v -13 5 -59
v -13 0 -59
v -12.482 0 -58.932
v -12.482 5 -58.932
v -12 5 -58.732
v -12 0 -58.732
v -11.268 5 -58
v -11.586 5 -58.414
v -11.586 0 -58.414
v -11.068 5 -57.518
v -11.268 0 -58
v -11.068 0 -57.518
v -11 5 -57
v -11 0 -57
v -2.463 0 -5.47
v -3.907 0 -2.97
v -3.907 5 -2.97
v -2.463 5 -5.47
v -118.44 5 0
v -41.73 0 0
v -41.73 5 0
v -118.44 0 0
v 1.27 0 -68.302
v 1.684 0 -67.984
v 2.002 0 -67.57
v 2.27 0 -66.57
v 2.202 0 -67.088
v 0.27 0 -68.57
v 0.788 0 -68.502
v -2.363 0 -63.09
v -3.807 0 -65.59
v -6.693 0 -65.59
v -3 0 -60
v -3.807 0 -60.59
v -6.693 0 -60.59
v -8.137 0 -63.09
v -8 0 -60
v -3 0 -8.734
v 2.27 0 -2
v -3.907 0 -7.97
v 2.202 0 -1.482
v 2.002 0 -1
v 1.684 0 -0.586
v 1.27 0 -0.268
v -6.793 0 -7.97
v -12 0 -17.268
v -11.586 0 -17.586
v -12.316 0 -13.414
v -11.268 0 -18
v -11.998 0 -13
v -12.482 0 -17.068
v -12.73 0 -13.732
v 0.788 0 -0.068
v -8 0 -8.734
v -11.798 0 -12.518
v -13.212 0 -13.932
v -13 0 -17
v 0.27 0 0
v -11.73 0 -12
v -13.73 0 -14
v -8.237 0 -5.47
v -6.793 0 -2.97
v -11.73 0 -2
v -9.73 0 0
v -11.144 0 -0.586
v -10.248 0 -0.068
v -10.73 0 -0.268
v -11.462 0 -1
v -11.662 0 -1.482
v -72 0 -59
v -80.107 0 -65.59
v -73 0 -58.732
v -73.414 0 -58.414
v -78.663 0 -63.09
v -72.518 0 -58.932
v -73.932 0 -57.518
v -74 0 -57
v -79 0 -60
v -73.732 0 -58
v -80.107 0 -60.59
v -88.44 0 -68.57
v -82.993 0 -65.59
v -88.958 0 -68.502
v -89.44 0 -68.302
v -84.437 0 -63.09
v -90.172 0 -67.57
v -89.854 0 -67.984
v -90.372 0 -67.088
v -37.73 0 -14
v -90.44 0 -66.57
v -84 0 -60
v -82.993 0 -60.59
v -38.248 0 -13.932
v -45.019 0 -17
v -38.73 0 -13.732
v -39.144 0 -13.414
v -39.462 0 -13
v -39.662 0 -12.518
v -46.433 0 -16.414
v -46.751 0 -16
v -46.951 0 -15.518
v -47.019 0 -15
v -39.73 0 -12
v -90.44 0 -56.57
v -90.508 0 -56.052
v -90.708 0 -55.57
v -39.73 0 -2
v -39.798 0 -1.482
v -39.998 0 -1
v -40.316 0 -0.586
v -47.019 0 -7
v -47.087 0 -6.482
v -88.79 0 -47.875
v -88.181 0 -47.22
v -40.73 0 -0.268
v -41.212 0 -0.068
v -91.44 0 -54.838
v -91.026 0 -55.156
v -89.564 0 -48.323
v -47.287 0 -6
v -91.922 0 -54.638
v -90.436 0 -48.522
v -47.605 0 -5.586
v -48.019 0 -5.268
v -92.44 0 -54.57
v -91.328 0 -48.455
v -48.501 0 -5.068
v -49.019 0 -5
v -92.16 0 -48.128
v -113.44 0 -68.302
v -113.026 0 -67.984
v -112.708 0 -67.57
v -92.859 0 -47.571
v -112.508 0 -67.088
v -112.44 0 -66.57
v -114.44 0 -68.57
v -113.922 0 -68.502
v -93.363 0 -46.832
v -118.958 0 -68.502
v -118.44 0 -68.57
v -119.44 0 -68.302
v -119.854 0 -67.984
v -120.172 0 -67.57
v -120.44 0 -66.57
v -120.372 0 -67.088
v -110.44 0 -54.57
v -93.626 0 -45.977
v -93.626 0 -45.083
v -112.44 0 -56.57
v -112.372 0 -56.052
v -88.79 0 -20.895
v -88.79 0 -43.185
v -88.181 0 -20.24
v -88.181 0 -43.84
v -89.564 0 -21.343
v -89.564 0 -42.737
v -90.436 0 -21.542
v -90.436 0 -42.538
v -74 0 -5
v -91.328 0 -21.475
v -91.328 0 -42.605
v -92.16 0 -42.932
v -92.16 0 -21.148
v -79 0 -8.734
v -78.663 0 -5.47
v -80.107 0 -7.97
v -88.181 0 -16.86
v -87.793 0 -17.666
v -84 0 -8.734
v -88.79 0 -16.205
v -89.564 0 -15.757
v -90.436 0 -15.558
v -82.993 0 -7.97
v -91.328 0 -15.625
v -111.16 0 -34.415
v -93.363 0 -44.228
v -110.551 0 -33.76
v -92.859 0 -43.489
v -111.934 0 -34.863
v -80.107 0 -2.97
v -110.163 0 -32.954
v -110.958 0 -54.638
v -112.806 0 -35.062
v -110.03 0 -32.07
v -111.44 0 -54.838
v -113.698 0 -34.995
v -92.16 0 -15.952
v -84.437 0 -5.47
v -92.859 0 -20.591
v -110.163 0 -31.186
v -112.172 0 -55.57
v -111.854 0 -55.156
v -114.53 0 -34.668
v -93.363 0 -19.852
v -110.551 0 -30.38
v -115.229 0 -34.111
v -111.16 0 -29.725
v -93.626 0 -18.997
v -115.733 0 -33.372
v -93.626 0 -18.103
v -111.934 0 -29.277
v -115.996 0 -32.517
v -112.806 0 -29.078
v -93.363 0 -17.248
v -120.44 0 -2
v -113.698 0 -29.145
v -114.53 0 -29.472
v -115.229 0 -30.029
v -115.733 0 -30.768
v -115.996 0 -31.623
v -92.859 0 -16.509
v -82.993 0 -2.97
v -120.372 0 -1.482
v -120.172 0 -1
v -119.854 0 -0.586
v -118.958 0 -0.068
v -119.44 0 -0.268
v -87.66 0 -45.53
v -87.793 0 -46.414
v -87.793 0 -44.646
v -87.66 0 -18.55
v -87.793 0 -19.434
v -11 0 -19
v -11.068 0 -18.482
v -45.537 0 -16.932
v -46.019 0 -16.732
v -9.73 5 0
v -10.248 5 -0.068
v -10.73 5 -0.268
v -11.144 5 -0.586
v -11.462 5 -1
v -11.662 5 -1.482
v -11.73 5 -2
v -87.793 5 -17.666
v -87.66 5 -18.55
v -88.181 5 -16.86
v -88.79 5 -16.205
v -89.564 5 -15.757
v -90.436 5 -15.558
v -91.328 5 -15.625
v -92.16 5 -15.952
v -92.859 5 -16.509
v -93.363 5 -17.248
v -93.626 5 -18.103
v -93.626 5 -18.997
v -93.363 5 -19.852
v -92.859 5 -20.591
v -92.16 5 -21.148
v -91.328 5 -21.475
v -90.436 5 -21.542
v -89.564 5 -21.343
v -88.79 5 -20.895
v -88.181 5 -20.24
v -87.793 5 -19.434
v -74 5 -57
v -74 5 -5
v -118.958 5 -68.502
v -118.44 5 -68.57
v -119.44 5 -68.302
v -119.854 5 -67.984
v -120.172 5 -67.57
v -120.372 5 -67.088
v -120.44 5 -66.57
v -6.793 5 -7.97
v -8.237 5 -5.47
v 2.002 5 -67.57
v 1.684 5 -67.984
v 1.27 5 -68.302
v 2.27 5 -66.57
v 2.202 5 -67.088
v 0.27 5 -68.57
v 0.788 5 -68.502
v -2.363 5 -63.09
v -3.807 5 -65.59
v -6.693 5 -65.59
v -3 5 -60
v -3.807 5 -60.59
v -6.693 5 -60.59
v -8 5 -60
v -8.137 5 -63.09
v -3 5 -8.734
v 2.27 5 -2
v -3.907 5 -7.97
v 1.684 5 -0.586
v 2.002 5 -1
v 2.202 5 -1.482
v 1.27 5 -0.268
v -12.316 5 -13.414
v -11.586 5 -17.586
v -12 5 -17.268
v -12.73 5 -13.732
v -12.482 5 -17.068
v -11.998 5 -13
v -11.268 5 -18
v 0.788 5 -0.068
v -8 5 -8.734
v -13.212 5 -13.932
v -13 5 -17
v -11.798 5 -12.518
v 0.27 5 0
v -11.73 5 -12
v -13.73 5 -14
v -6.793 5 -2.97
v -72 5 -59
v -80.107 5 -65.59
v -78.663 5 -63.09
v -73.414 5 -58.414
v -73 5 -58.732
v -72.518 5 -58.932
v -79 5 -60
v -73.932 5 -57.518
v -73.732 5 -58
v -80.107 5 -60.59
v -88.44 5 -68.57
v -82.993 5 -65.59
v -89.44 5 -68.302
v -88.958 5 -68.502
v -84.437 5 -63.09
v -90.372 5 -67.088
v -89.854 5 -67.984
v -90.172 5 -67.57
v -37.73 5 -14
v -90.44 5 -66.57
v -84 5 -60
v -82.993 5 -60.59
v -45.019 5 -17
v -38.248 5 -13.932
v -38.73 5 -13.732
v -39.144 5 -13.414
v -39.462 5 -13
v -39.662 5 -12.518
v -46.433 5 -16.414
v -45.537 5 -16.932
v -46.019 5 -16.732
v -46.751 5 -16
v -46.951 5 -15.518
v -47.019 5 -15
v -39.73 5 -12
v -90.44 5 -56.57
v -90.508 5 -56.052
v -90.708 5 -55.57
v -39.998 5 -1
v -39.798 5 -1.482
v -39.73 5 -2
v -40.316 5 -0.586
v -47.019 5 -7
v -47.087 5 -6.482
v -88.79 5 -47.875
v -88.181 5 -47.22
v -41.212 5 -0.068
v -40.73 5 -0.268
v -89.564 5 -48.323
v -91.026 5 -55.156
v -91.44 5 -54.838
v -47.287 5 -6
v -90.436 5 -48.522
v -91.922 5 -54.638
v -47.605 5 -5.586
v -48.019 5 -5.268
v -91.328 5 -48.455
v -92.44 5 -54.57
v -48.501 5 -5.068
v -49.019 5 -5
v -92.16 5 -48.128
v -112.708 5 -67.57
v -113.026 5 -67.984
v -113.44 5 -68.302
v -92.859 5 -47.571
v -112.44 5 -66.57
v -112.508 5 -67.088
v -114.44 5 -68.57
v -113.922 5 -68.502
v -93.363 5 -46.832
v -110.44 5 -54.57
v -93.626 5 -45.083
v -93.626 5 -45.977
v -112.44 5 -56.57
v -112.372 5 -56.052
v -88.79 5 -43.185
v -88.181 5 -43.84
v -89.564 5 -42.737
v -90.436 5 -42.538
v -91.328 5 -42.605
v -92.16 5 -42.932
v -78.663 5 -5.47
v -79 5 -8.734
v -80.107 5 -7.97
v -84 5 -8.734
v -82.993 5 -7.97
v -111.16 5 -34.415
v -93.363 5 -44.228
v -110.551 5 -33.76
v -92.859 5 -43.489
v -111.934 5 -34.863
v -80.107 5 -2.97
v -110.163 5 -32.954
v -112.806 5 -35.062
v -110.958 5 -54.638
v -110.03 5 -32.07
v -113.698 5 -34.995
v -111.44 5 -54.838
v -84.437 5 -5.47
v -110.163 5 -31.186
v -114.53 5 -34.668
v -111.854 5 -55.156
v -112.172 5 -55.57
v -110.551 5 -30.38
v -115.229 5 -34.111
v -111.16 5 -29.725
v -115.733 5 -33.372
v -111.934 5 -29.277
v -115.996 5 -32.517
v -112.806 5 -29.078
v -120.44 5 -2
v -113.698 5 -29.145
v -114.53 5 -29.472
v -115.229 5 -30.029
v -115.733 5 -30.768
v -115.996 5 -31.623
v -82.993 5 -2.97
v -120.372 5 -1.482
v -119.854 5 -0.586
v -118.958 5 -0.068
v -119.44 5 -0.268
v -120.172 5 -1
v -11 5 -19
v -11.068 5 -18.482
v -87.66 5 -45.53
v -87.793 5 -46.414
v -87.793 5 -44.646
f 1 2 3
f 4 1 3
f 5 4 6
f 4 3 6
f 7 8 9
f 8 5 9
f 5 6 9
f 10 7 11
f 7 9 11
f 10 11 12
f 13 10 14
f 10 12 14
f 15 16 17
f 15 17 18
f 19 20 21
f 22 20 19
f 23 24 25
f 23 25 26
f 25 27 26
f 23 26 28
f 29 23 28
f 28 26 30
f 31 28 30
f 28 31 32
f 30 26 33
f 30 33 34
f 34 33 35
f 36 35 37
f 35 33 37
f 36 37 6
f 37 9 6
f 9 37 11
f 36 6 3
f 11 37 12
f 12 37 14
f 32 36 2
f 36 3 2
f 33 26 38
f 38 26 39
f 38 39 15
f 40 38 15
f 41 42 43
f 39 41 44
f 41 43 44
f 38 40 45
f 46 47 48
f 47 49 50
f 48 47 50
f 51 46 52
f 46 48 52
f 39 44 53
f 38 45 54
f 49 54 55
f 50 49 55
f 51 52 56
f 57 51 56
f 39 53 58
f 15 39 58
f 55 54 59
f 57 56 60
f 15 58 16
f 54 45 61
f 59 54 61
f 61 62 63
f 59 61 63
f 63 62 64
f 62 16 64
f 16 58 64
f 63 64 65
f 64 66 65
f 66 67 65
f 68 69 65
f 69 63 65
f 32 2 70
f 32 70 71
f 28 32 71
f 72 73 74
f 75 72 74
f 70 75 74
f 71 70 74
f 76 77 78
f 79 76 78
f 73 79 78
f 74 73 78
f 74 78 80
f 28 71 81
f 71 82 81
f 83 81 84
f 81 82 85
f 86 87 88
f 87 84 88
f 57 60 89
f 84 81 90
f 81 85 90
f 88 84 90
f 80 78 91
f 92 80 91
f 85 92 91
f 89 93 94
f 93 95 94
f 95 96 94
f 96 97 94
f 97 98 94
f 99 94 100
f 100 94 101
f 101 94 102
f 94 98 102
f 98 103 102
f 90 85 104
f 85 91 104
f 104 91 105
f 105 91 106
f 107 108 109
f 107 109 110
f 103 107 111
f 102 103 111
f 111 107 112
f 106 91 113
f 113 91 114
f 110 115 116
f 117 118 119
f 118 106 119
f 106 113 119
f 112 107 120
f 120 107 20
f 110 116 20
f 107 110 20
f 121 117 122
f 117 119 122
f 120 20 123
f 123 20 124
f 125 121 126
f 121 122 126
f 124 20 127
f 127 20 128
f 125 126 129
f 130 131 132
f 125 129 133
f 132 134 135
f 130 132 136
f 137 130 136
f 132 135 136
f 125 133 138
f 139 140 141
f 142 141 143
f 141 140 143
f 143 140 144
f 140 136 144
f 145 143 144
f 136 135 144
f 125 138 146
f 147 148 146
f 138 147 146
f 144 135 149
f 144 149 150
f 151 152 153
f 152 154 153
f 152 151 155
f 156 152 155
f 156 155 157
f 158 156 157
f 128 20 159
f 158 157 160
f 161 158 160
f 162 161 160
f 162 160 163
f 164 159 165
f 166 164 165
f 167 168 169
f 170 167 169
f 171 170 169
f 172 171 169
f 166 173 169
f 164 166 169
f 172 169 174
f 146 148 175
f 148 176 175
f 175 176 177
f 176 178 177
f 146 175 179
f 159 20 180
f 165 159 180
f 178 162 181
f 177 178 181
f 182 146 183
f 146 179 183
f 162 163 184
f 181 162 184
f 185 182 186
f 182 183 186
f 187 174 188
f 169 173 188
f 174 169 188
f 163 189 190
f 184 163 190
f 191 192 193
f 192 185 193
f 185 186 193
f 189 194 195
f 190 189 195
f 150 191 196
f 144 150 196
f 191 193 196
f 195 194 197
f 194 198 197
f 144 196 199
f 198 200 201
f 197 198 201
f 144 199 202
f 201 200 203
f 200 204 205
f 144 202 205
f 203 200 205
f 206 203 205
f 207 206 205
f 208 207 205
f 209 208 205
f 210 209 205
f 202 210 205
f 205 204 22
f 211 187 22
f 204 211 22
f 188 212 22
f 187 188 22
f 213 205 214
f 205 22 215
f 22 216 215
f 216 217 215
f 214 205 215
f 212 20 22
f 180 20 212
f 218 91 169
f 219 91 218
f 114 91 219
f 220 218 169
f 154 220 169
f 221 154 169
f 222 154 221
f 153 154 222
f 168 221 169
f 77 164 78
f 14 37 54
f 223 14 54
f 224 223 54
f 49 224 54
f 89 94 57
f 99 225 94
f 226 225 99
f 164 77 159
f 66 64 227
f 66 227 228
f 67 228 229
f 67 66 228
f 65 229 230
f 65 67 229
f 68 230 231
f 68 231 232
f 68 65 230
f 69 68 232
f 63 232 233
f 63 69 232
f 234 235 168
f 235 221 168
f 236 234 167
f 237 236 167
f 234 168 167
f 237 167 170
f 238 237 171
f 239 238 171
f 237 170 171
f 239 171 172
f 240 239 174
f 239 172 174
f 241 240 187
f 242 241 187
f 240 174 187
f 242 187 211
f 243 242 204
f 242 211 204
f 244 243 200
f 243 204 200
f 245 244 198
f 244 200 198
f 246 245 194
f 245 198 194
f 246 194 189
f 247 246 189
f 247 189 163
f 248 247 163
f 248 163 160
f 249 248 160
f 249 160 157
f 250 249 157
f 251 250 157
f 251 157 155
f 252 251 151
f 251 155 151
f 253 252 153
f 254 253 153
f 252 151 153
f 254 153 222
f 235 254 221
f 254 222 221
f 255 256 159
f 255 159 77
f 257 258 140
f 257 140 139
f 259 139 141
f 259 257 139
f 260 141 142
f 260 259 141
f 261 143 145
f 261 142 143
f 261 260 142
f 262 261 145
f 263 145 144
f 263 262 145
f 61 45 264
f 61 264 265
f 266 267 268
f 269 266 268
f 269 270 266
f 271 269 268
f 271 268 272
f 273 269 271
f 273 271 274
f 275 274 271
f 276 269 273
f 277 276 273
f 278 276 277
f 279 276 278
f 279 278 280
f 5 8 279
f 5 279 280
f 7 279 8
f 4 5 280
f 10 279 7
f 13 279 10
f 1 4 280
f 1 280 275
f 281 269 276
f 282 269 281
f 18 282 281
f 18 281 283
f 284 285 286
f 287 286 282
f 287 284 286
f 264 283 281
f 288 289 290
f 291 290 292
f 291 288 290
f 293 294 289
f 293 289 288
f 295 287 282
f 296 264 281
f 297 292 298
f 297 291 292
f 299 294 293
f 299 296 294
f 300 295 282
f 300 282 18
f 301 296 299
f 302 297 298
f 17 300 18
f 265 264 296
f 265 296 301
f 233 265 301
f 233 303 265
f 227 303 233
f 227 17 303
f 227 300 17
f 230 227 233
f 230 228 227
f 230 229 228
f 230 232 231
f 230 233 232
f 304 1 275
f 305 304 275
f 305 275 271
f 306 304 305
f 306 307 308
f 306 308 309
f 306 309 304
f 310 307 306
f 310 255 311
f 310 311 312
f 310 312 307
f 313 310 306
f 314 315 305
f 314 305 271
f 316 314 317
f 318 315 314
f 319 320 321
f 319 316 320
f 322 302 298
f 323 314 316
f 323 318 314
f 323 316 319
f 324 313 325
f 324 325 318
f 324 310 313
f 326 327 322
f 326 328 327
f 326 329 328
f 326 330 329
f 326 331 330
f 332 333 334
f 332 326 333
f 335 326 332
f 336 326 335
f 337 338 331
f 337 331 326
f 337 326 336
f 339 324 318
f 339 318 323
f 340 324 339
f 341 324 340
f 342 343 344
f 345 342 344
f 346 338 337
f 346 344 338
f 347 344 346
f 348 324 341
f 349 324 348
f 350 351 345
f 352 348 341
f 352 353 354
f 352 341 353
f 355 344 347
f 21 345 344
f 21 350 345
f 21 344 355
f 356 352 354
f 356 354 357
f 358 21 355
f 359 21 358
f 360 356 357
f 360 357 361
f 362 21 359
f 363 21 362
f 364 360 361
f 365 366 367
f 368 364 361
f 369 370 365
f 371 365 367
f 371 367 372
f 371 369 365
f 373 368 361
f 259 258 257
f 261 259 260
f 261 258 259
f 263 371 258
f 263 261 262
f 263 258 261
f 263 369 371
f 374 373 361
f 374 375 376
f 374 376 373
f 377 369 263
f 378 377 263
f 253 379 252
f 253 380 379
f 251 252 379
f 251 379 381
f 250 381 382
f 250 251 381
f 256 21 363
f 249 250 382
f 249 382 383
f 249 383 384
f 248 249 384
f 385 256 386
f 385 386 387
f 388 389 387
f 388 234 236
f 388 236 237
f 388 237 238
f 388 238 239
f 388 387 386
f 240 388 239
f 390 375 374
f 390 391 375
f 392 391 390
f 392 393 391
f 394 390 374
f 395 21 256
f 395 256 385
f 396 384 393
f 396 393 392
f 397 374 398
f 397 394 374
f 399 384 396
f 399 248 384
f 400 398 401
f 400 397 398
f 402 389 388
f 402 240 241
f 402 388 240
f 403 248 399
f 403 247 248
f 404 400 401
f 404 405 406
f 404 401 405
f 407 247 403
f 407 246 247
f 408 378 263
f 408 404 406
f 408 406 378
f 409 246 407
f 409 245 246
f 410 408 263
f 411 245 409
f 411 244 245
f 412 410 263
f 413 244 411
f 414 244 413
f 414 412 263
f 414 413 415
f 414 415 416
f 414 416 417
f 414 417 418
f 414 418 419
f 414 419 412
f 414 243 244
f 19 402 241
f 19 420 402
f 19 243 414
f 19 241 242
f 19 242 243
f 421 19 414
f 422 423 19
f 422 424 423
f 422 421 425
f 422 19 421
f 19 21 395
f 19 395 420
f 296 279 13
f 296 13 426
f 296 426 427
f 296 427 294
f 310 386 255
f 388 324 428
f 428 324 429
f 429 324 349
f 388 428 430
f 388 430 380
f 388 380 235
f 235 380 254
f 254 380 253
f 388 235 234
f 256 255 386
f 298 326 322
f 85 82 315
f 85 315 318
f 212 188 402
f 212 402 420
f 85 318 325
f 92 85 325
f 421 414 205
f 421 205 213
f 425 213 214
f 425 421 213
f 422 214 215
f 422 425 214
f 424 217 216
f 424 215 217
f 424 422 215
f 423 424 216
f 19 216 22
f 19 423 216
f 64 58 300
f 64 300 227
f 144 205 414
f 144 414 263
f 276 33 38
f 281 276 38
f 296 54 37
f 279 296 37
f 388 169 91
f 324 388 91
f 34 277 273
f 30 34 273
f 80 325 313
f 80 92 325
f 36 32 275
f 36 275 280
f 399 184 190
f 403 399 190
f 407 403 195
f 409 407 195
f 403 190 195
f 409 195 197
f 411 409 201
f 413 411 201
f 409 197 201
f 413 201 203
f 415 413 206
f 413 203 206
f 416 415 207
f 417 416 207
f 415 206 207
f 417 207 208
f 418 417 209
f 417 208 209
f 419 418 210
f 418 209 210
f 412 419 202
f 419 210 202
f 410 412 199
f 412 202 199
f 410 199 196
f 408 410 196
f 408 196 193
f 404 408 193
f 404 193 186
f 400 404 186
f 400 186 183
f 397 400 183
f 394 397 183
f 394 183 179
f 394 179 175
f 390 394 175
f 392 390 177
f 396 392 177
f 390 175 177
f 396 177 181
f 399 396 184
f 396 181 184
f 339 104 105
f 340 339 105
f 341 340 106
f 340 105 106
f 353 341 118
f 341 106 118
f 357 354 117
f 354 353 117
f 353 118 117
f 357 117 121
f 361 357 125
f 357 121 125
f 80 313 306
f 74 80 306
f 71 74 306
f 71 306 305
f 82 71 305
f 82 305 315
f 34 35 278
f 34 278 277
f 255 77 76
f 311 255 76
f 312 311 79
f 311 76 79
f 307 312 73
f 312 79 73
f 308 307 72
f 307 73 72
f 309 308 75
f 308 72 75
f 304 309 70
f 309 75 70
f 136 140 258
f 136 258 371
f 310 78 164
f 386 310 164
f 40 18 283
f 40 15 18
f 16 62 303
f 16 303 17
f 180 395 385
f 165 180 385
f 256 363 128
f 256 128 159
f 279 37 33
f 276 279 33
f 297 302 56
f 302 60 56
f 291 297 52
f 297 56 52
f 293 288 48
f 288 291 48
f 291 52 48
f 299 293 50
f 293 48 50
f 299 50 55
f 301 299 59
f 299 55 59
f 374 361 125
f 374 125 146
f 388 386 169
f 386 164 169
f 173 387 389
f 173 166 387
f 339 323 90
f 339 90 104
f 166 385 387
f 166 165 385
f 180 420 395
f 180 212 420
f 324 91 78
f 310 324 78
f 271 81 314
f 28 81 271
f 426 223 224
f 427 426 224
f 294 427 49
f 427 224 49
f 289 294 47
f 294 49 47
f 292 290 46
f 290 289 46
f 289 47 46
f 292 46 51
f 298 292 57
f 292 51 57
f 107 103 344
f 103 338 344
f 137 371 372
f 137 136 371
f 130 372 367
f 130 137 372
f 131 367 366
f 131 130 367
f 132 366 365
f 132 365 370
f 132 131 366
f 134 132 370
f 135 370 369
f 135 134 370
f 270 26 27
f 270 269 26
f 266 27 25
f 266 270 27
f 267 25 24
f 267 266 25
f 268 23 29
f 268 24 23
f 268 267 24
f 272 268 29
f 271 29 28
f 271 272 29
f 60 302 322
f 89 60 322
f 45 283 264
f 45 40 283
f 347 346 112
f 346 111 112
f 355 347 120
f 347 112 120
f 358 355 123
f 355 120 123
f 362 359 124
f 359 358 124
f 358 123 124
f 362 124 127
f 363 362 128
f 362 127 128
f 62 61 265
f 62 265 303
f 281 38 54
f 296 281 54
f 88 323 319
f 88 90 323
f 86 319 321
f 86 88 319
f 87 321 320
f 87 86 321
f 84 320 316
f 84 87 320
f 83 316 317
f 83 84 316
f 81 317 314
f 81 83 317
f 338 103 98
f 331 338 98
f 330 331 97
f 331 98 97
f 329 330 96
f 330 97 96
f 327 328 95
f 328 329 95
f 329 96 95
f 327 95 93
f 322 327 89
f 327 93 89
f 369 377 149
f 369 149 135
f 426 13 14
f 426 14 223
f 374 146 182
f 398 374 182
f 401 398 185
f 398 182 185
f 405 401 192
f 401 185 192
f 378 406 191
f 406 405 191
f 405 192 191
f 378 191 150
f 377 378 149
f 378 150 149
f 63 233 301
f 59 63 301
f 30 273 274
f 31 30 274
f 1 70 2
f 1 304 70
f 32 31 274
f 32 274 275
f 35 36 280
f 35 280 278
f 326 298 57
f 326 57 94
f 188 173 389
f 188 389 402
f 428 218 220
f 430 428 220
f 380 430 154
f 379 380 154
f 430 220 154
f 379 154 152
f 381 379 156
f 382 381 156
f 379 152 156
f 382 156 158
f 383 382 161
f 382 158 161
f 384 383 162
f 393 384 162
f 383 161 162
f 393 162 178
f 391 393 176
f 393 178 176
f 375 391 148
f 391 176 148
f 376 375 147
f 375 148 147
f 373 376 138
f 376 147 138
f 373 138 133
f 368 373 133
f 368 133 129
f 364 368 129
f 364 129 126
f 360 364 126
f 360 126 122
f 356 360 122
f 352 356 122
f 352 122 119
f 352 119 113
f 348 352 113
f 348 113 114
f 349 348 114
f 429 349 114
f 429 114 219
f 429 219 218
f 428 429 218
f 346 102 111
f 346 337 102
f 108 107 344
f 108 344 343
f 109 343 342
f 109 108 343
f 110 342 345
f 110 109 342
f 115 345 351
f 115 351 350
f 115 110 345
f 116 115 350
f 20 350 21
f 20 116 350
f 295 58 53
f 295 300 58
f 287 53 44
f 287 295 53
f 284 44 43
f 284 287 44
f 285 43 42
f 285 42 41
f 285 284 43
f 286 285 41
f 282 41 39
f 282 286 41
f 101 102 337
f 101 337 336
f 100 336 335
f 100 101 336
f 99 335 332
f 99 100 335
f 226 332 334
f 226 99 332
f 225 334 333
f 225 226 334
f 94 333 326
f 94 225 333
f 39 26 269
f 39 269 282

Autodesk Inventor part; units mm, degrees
ref_plane "YZ Plane" through (0, 0, 0) normal (1, 0, 0) x (0, 1, 0)
ref_plane "XZ Plane" through (0, 0, 0) normal (0, 1, 0) x (-1, 0, 0)
ref_plane "XY Plane" through (0, 0, 0) normal (0, 0, 1) x (1, 0, 0)
sketch "Sketch1" plane through (0, 0, 0) normal (0, 1, 0) x (-1, 0, 0)
  line L0 (-2.27, 0) -> (120.44, 0)
  line L1 (120.44, 0) -> (120.44, -68.57)
  line L2 (120.44, -68.57) -> (-2.27, -68.57)
  line L3 (-2.27, -68.57) -> (-2.27, 0)
  line L4 (120.44, -66.57) -> (120.44, -2)
  line L5 (0, -68.57) -> (118.44, -68.57)
  line L6 (-2.27, -2.27) -> (-2.27, -66.3)
  circle A0 centre (81.55, -63.09) radius 1.5
  circle A1 centre (81.55, -63.09) radius 1.5
  line L7 (70.44, -68.57) -> (15.73, -68.57)
  line L8 (51, 0) -> (75, 0)
  line L9 (26, 0) -> (51, 0)
  line L10 (84, -60) -> (79, -60)
  line L11 (79, -60) -> (79, -8.7337)
  line L12 (79, -8.7337) -> (84, -8.7337)
  line L13 (84, -8.7337) -> (84, -60)
  line L14 (8, -60) -> (3, -60)
  line L15 (3, -60) -> (3, -8.7337)
  line L16 (3, -8.7337) -> (8, -8.7337)
  line L17 (8, -8.7337) -> (8, -60)
  circle A2 centre (5.25, -63.09) radius 1.5
  circle A3 centre (5.35, -5.47) radius 1.5
  circle A4 centre (81.55, -5.47) radius 1.5
  circle A5 centre (81.55, -5.47) radius 1.5
  circle A6 centre (5.35, -5.47) radius 1.5
  circle A7 centre (5.25, -63.09) radius 1.5
  dimension "d20" = 3
  dimension "d27" = 3
  dimension "d28" = 3
  dimension "d29" = 3
  dimension "d30" = 68.57
extrude "Extrusion1" add sketch "Sketch1" along normal blind 5
fillet "Fillet4" radius 2 4 edges at (-120.44, 2.5, -68.57) (-120.44, 2.5, 0) (2.27, 2.5, -68.57) (2.27, 2.5, 0)
sketch "Sketch7" plane through (0, 5, 0) normal (0, 1, 0) x (1, 0, 0)
  line L0 (-117.44, 63.57) -> (-87.44, 63.57)
  line L1 (-87.44, 63.57) -> (-87.44, 5)
  line L2 (-87.44, 5) -> (-117.44, 5)
  line L3 (-117.44, 5) -> (-117.44, 63.57)
  line L4 (-120.44, 66.57) -> (-120.44, 2) projected
  line L5 (0.27, 68.57) -> (-118.44, 68.57) projected
  line L6 (-118.44, 0) -> (0.27, 0) projected
  point P0 (0, 0)
  dimension "d67" = 30
  dimension "d68" = 3
  dimension "d69" = 5
  dimension "d70" = 5
extrude "Extrusion6" [suppressed]
fillet "Fillet8" [suppressed]
sketch "Sketch8" plane through (0, 5, 0) normal (0, 1, 0) x (1, 0, 0)
  line L0 (-118.44, 0) -> (0.27, 0) projected
  line L1 (-39.73, 0) -> (-11.73, 0)
  line L2 (-11.73, 0) -> (-11.73, 14)
  line L3 (-11.73, 14) -> (-39.73, 14)
  line L4 (-39.73, 14) -> (-39.73, 0)
  line L5 (2.27, 2) -> (2.27, 66.57) projected
  point P0 (0, 0)
  point P1 (-11.73, 0)
  dimension "d74" = 28
  dimension "d75" = 14
  dimension "d82" = 14
extrude "Extrusion7" cut sketch "Sketch8" against normal blind 10
sketch "Sketch9" plane through (0, 5, 0) normal (0, 1, 0) x (1, 0, 0)
  line L0 (-74, 59) -> (-11, 59)
  line L1 (-11, 59) -> (-11, 17)
  line L2 (-11, 17) -> (-74, 17)
  line L3 (-74, 17) -> (-74, 59)
  line L4 (-74, 17) -> (-47.019, 17)
  line L5 (-47.019, 17) -> (-47.019, 5)
  line L6 (-47.019, 5) -> (-74, 5)
  line L7 (-74, 5) -> (-74, 17)
  point P0 (0, 0)
extrude "Extrusion8" cut sketch "Sketch9" against normal blind 5
fillet "Fillet9" radius 2 5 edges at (-74, 2.5, -59) (-11, 2.5, -59) (-11, 2.5, -17) (-47.019, 2.5, -5) (-47.019, 2.5, -17)
fillet "Fillet10" radius 2 4 edges at (-39.73, 2.5, -14) (-11.73, 2.5, -14) (-11.73, 2.5, 0) (-39.73, 2.5, 0)
sketch "Sketch10" plane through (0, 0, 0) normal (0, -1, 0) x (1, 0, 0)
  circle A0 centre (-90.66, -18.55) radius 3
  circle A1 centre (-113.03, -32.07) radius 3
  circle A2 centre (-90.66, -45.53) radius 3
  line L0 (-120.44, -66.57) -> (-120.44, -2) projected
  line L1 (-118.44, 0) -> (-41.73, 0) projected
  line L2 (-90.66, -45.53) -> (-90.66, -18.55) construction
  point P0 (0, 0)
  dimension "d83" = 29.78
  dimension "d84" = 18.55
  dimension "d85" = 6
  dimension "d86" = 13.52
  dimension "d87" = 6
  dimension "d88" = 22.37
  dimension "d89" = 13.46
  dimension "d90" = 6
extrude "Extrusion9" cut sketch "Sketch10" against normal blind 10
sketch "Sketch11" plane through (0, 0, 0) normal (0, -1, 0) x (1, 0, 0)
  circle A0 centre (-90.66, -18.55) radius 3 projected
  line L0 (-92.9694, -18.55) -> (-91.8147, -16.55)
  line L1 (-91.8147, -16.55) -> (-89.5053, -16.55)
  line L2 (-89.5053, -16.55) -> (-88.3506, -18.55)
  line L3 (-88.3506, -18.55) -> (-89.5053, -20.55)
  line L4 (-89.5053, -20.55) -> (-91.8147, -20.55)
  line L5 (-91.8147, -20.55) -> (-92.9694, -18.55)
  circle A1 centre (-113.03, -32.07) radius 3 projected
  line L6 (-115.3394, -32.07) -> (-114.1847, -30.07)
  line L7 (-114.1847, -30.07) -> (-111.8753, -30.07)
  line L8 (-111.8753, -30.07) -> (-110.7206, -32.07)
  line L9 (-110.7206, -32.07) -> (-111.8753, -34.07)
  line L10 (-111.8753, -34.07) -> (-114.1847, -34.07)
  line L11 (-114.1847, -34.07) -> (-115.3394, -32.07)
  circle A2 centre (-90.66, -45.53) radius 3 projected
  line L12 (-92.9694, -45.53) -> (-91.8147, -43.53)
  line L13 (-91.8147, -43.53) -> (-89.5053, -43.53)
  line L14 (-89.5053, -43.53) -> (-88.3506, -45.53)
  line L15 (-88.3506, -45.53) -> (-89.5053, -47.53)
  line L16 (-89.5053, -47.53) -> (-91.8147, -47.53)
  line L17 (-91.8147, -47.53) -> (-92.9694, -45.53)
  point P0 (0, 0)
  dimension "d93" = 4
  dimension "d94" = 4
  dimension "d95" = 4
extrude "Extrusion10" [suppressed]
sketch "Sketch12" plane through (0, 0, 0) normal (0, -1, 0) x (1, 0, 0)
  circle A0 centre (-5.35, -5.47) radius 1.5 projected
  line L0 (-8.2368, -5.47) -> (-6.7934, -2.97)
  line L1 (-6.7934, -2.97) -> (-3.9066, -2.97)
  line L2 (-3.9066, -2.97) -> (-2.4632, -5.47)
  line L3 (-2.4632, -5.47) -> (-3.9066, -7.97)
  line L4 (-3.9066, -7.97) -> (-6.7934, -7.97)
  line L5 (-6.7934, -7.97) -> (-8.2368, -5.47)
  circle A1 centre (-81.55, -5.47) radius 1.5 projected
  line L6 (-84.4368, -5.47) -> (-82.9934, -2.97)
  line L7 (-82.9934, -2.97) -> (-80.1066, -2.97)
  line L8 (-80.1066, -2.97) -> (-78.6632, -5.47)
  line L9 (-78.6632, -5.47) -> (-80.1066, -7.97)
  line L10 (-80.1066, -7.97) -> (-82.9934, -7.97)
  line L11 (-82.9934, -7.97) -> (-84.4368, -5.47)
  circle A2 centre (-81.55, -63.09) radius 1.5 projected
  line L12 (-84.4368, -63.09) -> (-82.9934, -60.59)
  line L13 (-82.9934, -60.59) -> (-80.1066, -60.59)
  line L14 (-80.1066, -60.59) -> (-78.6632, -63.09)
  line L15 (-78.6632, -63.09) -> (-80.1066, -65.59)
  line L16 (-80.1066, -65.59) -> (-82.9934, -65.59)
  line L17 (-82.9934, -65.59) -> (-84.4368, -63.09)
  circle A3 centre (-5.25, -63.09) radius 1.5 projected
  line L18 (-6.6934, -60.59) -> (-3.8066, -60.59)
  line L19 (-3.8066, -60.59) -> (-2.3632, -63.09)
  line L20 (-2.3632, -63.09) -> (-3.8066, -65.59)
  line L21 (-3.8066, -65.59) -> (-6.6934, -65.59)
  line L22 (-6.6934, -65.59) -> (-8.1368, -63.09)
  line L23 (-8.1368, -63.09) -> (-6.6934, -60.59)
  line L24 (-8, -60) -> (-3, -60) projected
  line L25 (-84, -60) -> (-79, -60) projected
  line L26 (-79, -8.7337) -> (-84, -8.7337) projected
  line L27 (-3, -8.7337) -> (-8, -8.7337) projected
  point P0 (0, 0)
  dimension "d98" = 5
  dimension "d99" = 5
  dimension "d100" = 5
extrude "Extrusion11" cut sketch "Sketch12" against normal blind 10
sketch "Sketch13" plane through (0, 5, 0) normal (0, 1, 0) x (1, 0, 0)
  line L0 (0.27, 68.57) -> (-118.44, 68.57) projected
  line L1 (-112.44, 68.57) -> (-90.44, 68.57)
  line L2 (-90.44, 68.57) -> (-90.44, 54.57)
  line L3 (-90.44, 54.57) -> (-112.44, 54.57)
  line L4 (-112.44, 54.57) -> (-112.44, 68.57)
  line L5 (-120.44, 66.57) -> (-120.44, 2) projected
  point P0 (0, 0)
  point P1 (-90.44, 68.57)
  dimension "d103" = 8
  dimension "d104" = 22
  dimension "d105" = 14
extrude "Extrusion12" cut sketch "Sketch13" against normal blind 10
fillet "Fillet11" radius 2 4 edges at (-112.44, 2.5, -68.57) (-90.44, 2.5, -68.57) (-112.44, 2.5, -54.57) (-90.44, 2.5, -54.57)
properties part number "Middle PMMA"
